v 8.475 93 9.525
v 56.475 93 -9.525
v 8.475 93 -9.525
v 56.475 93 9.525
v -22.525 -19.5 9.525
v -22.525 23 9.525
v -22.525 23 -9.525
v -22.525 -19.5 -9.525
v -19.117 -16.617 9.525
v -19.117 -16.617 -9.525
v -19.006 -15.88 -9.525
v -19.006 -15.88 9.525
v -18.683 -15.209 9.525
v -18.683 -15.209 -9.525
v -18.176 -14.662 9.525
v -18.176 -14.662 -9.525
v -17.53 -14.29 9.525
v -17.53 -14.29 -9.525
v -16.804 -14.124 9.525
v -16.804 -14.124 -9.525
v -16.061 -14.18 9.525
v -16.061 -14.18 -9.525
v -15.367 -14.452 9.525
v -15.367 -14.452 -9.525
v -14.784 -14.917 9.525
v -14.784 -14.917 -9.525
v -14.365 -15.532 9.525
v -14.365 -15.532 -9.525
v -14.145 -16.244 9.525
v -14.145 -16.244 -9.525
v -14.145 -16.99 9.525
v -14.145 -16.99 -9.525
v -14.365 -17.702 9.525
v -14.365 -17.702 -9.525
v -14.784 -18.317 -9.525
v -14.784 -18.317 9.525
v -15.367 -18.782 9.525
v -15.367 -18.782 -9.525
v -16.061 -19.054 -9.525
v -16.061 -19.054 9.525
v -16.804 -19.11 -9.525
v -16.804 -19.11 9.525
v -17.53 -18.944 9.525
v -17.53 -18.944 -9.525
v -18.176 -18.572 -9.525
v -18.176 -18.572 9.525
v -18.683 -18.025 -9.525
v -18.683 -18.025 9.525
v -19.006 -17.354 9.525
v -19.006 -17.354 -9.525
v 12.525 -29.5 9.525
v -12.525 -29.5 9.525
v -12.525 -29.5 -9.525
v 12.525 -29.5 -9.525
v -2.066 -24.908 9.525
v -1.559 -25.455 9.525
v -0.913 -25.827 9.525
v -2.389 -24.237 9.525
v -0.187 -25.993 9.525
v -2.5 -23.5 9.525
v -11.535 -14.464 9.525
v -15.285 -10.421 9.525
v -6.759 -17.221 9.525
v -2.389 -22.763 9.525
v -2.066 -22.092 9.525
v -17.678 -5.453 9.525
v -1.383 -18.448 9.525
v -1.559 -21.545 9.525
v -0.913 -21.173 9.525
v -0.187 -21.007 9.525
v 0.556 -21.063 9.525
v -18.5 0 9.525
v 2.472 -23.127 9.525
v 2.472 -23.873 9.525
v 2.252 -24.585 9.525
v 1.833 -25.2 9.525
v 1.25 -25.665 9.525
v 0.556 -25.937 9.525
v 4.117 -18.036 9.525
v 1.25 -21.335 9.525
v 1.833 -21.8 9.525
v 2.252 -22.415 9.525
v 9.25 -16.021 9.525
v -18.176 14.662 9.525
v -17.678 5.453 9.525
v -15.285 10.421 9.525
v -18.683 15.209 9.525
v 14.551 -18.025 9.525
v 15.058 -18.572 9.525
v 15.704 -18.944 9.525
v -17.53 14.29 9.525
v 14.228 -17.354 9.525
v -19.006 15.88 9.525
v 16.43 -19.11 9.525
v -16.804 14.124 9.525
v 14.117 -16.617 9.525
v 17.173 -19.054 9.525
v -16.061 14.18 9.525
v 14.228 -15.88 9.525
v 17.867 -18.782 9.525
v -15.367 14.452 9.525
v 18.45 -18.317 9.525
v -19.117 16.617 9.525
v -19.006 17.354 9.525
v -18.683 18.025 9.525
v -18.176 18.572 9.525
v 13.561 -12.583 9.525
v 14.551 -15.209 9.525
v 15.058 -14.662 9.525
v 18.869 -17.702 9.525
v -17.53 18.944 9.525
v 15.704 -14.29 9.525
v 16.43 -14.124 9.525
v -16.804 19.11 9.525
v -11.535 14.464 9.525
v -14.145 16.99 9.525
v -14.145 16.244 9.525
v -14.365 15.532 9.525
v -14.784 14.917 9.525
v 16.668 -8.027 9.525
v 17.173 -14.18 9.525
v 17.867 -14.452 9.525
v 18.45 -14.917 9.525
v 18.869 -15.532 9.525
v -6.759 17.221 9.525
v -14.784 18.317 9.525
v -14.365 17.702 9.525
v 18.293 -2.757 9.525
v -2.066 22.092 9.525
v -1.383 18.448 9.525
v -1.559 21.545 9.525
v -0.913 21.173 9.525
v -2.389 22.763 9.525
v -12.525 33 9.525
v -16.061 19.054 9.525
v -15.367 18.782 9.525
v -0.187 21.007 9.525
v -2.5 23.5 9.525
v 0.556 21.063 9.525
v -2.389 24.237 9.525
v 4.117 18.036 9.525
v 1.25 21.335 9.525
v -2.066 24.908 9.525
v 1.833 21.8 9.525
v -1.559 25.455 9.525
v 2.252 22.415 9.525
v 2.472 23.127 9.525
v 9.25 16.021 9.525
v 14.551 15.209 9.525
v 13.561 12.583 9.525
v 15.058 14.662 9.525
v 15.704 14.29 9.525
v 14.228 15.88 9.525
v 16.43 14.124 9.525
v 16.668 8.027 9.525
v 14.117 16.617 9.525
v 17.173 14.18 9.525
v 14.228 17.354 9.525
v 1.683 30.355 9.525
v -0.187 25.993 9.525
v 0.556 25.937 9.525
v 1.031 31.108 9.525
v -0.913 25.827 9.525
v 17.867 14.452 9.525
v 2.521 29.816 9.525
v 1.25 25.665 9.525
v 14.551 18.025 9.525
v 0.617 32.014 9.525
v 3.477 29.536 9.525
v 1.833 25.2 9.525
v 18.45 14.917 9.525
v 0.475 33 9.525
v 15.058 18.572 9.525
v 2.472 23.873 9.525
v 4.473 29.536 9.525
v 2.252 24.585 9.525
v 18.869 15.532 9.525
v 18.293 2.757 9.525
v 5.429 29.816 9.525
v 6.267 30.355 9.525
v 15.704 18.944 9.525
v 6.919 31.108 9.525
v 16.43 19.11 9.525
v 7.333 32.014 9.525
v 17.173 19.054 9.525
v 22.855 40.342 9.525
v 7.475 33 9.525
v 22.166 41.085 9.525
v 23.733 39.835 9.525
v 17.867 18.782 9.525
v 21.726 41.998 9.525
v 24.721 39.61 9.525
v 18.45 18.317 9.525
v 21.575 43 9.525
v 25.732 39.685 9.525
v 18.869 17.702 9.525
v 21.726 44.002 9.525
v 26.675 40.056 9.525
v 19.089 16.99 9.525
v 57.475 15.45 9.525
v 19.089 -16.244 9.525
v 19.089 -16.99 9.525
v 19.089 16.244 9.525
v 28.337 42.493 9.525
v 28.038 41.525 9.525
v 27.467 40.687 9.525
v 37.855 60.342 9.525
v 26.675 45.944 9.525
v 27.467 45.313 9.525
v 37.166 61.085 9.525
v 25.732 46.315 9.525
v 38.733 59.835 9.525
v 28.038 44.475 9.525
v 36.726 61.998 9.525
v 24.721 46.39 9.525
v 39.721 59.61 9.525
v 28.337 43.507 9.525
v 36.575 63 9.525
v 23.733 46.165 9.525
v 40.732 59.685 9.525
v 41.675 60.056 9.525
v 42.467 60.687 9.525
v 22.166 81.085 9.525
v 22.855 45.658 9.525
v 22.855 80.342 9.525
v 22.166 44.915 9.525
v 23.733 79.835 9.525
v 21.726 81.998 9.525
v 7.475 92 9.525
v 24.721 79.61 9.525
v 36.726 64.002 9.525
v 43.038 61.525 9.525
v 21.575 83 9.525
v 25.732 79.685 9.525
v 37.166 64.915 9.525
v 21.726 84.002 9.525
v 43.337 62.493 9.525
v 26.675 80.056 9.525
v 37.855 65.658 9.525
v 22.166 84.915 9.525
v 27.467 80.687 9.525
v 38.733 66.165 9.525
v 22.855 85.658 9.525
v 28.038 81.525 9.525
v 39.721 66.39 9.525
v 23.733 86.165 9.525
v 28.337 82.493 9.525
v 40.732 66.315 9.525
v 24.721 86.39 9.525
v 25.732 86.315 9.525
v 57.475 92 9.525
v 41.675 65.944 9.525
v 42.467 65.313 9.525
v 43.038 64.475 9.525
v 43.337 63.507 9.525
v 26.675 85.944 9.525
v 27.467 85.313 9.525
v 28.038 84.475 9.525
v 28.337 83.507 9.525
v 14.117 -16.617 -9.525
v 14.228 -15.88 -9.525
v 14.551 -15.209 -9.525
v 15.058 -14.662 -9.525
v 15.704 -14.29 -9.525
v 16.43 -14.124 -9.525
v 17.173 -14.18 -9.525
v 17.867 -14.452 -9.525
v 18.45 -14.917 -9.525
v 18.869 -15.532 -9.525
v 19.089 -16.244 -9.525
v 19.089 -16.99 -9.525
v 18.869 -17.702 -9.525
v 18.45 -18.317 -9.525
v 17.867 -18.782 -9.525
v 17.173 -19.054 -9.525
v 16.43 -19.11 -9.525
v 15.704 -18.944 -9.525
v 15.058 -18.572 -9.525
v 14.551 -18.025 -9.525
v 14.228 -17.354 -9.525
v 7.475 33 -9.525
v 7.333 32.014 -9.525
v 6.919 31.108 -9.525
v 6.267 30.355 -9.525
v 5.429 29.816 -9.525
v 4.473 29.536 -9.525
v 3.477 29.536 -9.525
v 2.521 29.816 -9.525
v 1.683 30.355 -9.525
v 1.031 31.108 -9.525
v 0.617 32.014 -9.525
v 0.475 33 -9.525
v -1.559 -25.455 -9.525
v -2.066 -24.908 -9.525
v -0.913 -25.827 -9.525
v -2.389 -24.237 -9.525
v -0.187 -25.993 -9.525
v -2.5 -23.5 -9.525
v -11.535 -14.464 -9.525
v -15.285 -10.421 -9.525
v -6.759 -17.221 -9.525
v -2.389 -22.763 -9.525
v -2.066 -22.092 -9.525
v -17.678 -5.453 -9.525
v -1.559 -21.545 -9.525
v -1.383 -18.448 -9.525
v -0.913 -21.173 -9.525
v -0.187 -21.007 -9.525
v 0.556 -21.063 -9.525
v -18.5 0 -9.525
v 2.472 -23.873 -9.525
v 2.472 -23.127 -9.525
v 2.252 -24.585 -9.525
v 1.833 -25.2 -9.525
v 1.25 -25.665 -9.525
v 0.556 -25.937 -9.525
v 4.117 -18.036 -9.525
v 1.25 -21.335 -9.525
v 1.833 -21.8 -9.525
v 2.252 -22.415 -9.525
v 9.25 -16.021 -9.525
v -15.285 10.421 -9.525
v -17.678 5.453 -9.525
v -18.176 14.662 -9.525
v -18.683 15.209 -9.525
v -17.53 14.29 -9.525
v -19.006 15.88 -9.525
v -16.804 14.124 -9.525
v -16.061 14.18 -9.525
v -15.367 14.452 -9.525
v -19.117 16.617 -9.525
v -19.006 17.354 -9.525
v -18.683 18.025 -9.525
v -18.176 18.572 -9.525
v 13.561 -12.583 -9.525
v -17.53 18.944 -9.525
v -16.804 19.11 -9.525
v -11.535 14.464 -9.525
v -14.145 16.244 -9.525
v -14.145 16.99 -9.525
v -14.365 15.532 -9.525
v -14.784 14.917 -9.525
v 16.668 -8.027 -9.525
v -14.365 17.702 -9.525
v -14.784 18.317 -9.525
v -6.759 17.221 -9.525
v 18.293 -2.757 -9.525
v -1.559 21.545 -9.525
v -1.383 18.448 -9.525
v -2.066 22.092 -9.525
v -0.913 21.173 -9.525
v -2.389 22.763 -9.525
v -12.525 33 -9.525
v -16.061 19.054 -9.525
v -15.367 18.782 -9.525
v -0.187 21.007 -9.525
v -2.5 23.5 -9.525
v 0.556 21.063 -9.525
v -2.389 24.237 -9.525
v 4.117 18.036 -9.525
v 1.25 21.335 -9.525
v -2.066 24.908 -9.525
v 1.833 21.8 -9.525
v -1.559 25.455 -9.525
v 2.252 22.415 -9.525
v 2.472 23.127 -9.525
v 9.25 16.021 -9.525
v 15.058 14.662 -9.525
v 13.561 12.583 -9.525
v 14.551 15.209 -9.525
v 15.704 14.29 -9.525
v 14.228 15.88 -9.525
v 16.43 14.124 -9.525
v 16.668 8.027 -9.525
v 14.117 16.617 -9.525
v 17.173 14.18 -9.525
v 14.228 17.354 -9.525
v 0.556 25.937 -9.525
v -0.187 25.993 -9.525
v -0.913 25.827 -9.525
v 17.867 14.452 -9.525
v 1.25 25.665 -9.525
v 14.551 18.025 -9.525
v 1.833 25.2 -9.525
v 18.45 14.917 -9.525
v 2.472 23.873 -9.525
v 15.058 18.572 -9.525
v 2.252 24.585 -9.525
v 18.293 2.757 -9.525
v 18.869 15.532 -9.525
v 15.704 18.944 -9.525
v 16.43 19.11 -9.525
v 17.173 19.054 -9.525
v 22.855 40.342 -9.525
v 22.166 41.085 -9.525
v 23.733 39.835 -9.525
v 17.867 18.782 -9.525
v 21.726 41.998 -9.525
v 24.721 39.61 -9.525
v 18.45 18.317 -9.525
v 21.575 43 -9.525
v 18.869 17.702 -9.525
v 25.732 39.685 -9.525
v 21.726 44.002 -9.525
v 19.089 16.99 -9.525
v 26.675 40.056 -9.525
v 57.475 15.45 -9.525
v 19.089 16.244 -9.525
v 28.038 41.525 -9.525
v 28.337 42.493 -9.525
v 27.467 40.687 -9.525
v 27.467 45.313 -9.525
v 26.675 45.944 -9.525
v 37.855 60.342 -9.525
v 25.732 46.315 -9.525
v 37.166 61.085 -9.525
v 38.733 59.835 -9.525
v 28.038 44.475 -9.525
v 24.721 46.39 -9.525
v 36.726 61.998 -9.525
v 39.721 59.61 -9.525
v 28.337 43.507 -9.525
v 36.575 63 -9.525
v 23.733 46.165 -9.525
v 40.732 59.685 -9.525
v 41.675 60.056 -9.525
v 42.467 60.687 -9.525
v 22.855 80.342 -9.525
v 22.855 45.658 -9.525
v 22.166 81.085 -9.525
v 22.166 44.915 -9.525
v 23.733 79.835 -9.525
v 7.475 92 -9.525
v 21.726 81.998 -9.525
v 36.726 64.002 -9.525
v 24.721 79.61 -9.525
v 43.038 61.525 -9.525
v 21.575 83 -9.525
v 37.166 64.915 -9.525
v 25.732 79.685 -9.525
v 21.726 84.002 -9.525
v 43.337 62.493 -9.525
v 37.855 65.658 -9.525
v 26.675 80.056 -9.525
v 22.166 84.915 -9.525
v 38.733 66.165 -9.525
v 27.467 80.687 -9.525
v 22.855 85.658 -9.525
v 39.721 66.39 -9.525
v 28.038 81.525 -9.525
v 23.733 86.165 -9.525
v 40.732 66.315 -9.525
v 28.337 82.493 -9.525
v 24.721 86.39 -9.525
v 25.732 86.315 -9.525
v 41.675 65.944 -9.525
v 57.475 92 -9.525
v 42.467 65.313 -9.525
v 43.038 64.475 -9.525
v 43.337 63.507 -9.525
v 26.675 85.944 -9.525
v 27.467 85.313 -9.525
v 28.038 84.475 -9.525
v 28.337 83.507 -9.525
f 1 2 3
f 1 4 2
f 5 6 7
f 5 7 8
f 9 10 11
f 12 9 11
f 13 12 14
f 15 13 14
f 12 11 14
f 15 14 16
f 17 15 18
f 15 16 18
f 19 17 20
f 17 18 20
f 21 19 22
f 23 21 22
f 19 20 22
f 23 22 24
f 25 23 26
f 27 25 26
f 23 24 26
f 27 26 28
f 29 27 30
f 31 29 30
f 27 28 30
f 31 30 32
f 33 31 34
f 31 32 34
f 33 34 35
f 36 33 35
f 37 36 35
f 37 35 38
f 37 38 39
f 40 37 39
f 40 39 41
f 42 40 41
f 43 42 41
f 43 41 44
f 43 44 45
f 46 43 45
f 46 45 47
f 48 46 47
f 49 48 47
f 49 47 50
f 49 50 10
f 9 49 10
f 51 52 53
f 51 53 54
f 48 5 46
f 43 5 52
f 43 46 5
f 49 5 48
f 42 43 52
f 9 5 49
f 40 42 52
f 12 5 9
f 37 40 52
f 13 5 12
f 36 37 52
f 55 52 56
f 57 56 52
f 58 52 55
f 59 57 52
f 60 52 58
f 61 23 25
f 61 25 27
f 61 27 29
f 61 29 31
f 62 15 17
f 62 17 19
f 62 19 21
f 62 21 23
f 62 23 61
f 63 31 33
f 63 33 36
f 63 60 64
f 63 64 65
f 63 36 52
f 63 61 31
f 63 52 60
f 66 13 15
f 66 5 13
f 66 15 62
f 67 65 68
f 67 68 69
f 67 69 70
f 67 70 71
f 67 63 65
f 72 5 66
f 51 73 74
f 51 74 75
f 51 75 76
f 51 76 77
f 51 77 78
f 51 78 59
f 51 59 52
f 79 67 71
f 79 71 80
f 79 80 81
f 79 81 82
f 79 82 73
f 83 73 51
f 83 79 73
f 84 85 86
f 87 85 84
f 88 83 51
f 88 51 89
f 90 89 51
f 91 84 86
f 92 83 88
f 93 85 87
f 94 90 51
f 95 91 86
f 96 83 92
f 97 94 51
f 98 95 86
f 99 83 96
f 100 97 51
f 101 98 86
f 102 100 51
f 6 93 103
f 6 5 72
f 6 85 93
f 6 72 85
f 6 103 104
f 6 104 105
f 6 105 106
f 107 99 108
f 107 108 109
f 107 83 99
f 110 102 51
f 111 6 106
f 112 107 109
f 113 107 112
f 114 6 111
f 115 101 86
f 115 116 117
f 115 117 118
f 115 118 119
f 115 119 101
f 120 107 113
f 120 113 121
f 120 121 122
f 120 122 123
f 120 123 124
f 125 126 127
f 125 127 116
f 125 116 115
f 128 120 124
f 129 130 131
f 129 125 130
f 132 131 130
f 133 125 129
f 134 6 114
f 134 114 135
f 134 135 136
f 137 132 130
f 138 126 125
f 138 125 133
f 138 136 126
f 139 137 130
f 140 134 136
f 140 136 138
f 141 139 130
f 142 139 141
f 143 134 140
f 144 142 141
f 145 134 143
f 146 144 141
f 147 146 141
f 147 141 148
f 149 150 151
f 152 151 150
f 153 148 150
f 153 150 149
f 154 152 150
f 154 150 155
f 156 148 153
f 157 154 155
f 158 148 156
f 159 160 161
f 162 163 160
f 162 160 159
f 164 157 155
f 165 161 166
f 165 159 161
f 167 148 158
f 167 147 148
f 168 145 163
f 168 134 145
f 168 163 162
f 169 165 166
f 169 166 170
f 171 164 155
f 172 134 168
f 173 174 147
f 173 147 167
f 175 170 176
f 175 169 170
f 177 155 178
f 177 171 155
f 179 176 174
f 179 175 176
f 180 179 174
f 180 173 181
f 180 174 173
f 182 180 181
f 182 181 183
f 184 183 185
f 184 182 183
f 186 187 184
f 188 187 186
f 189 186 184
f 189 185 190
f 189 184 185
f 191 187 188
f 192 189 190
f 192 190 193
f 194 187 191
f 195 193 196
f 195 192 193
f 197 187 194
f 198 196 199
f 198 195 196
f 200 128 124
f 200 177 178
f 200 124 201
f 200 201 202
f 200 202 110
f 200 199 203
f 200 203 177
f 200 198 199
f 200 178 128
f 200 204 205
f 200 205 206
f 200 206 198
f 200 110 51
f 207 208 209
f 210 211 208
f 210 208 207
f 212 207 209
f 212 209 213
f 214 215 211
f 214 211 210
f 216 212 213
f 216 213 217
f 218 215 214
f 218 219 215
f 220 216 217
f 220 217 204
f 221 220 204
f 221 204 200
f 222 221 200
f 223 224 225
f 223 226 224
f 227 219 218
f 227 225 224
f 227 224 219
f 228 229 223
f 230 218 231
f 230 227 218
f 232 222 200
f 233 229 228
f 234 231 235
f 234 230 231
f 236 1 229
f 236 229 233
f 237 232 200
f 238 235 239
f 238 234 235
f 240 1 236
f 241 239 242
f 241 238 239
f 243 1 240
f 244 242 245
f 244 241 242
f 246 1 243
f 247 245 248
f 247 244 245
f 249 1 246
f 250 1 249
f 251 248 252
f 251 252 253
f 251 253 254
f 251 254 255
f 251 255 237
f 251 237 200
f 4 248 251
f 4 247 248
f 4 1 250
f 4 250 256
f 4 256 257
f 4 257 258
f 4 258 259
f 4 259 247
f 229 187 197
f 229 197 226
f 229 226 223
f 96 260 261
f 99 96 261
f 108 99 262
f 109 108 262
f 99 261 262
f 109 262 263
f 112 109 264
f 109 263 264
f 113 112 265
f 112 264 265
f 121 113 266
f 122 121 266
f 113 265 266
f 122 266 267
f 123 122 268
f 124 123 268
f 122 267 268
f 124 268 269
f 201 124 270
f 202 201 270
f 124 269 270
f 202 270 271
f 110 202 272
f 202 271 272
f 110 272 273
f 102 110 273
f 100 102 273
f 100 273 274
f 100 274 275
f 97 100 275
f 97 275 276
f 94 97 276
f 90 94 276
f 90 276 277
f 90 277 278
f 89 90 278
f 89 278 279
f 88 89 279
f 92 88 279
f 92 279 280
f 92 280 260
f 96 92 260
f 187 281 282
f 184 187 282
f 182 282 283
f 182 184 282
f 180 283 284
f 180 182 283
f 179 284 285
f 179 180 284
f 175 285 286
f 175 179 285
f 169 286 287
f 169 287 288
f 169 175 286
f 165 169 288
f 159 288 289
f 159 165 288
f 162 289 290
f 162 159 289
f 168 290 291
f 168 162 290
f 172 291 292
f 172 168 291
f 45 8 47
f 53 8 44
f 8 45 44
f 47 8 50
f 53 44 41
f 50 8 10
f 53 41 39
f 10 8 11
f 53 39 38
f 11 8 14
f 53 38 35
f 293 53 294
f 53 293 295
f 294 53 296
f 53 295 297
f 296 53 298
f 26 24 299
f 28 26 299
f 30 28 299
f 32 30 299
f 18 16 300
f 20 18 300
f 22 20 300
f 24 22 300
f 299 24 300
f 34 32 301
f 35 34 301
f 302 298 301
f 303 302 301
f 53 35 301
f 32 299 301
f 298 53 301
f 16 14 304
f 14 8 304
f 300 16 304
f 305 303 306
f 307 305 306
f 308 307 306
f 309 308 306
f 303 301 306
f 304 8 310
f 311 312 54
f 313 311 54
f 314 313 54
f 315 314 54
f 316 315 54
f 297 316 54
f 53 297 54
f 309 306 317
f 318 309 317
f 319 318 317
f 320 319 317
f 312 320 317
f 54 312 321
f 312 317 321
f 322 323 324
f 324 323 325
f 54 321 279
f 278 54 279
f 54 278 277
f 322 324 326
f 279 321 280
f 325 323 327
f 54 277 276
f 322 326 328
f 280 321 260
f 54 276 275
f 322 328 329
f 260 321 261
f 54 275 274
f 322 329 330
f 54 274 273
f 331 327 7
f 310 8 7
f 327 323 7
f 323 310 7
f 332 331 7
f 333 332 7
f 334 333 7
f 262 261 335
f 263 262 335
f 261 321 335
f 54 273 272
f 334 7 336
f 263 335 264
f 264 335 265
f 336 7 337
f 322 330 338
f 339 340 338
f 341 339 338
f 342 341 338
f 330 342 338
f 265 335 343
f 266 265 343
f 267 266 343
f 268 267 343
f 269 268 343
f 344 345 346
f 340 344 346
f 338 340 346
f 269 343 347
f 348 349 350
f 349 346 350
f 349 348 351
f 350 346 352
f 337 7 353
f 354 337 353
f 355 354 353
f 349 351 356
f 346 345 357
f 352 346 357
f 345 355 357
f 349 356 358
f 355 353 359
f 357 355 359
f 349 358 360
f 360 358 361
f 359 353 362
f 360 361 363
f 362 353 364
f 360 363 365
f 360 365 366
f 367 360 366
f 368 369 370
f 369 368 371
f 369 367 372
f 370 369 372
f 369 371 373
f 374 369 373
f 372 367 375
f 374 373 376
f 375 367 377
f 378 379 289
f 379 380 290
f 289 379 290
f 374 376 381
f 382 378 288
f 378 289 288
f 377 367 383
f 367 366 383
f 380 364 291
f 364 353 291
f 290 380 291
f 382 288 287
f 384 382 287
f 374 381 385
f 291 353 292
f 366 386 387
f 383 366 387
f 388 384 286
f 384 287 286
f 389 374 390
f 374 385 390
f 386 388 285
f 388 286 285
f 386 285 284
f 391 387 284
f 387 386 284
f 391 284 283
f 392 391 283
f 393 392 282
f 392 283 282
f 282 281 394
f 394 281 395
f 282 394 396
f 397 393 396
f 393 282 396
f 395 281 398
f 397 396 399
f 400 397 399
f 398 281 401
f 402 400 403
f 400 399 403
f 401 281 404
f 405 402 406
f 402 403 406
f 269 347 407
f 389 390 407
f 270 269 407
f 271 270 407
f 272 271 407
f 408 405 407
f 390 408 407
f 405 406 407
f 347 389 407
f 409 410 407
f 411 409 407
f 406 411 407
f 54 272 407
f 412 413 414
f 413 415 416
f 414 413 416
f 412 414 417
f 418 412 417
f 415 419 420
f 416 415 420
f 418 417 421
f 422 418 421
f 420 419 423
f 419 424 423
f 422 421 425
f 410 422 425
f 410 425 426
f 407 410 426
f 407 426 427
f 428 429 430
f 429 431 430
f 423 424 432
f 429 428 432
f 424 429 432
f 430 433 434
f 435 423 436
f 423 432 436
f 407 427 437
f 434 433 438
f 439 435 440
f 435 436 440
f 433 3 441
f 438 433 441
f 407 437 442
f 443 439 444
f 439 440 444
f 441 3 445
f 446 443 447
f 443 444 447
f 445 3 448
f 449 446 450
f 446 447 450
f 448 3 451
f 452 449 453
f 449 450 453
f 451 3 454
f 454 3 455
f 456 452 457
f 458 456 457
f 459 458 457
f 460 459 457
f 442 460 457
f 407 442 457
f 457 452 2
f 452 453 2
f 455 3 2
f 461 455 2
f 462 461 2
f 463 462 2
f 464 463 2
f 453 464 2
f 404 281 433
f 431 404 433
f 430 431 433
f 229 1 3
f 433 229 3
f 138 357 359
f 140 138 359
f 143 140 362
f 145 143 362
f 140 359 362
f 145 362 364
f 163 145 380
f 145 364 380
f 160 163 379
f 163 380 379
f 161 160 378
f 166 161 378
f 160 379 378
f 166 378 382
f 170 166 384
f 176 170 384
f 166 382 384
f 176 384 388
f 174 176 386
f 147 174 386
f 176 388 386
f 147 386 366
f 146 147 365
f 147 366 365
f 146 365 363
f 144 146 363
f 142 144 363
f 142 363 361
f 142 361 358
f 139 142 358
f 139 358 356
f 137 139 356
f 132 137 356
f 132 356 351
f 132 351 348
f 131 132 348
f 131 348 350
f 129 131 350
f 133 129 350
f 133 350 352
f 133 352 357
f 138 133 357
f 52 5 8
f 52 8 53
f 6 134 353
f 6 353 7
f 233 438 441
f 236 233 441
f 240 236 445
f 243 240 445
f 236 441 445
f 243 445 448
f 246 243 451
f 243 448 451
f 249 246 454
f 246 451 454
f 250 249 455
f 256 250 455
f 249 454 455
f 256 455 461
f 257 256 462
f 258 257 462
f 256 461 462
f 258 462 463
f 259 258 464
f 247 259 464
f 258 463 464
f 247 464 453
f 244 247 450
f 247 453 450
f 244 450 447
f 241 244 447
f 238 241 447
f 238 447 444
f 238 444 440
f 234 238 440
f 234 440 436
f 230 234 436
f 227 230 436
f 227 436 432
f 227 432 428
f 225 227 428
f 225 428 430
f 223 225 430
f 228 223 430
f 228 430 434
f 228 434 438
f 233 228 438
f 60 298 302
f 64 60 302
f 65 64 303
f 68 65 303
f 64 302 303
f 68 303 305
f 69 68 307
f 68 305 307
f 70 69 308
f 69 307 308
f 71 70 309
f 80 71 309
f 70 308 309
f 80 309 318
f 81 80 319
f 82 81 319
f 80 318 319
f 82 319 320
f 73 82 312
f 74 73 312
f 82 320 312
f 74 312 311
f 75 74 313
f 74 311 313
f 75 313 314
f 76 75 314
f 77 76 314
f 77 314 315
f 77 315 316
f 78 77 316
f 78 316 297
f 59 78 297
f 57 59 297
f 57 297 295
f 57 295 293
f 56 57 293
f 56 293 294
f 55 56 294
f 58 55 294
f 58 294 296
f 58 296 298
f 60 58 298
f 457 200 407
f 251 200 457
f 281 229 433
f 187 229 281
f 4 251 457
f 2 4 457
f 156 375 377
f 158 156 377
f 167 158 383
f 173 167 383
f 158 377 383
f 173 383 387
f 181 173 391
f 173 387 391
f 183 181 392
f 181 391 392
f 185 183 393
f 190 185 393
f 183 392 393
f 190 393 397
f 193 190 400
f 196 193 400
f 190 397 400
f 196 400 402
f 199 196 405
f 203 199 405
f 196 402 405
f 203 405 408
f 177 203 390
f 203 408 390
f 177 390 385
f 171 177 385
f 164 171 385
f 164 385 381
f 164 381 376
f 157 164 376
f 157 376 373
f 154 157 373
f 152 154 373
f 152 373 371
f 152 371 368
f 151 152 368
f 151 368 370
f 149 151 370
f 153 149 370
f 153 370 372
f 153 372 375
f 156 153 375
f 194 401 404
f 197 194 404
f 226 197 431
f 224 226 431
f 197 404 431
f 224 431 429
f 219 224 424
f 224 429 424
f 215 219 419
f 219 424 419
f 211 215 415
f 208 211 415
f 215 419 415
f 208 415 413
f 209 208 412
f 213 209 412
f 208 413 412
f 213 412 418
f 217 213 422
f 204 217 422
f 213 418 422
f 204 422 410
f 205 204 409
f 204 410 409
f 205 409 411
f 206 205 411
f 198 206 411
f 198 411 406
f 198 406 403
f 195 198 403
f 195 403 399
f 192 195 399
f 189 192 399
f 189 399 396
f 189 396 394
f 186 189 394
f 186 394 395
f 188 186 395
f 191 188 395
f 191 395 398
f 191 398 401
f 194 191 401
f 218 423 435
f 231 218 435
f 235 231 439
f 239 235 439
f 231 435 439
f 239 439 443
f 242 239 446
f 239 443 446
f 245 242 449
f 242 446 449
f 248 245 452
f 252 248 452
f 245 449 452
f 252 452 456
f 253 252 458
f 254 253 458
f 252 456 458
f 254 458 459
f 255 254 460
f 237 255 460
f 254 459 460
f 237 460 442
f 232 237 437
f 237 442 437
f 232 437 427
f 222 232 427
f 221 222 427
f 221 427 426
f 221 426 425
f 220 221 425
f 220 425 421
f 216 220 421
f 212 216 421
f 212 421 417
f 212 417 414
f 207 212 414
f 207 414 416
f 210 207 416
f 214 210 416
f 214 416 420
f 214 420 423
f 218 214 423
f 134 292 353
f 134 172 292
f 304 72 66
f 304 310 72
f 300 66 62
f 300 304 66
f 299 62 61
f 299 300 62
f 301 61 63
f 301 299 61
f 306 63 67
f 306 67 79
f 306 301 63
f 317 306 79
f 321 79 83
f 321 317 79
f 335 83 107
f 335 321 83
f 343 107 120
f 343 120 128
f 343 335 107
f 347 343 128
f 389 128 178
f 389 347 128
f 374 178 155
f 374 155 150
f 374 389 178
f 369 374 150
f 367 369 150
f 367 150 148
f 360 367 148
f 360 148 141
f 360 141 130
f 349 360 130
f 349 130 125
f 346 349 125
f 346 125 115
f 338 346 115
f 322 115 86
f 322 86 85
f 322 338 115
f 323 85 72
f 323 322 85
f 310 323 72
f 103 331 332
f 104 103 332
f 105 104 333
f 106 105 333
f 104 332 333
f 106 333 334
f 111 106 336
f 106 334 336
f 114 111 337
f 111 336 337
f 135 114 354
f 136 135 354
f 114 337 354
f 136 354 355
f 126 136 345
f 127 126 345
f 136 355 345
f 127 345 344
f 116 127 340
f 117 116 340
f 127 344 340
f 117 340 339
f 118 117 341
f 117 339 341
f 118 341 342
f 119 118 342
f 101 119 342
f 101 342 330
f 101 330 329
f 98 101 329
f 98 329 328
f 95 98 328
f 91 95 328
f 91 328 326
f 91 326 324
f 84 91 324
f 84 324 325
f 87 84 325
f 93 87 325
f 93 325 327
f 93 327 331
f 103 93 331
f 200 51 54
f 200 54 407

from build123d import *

# Parameters (mm, degrees)
SKETCH1_R              = 18.5
BOSS_EXTRUDE1_DEPTH    = 9.525
M8X1_25_TAPPED_HOLE1_D = 6.8
TAPPED_HOLE0_D         = 5
CHAMFER1_SIZE          = 1


with BuildPart() as part:
    # Sketch1 → Boss-Extrude1 (new, symmetric)
    with BuildSketch(Plane.XY):
        with BuildLine():
            Line((0.475, 33), (-12.525, 33))
            Line((-12.525, 33), (-22.525, 23))
            Line((-22.525, 23), (-22.525, -19.5))
            Line((-22.525, -19.5), (-12.525, -29.5))
            Line((-12.525, -29.5), (12.525, -29.5))
            Line((12.525, -29.5), (57.475, 15.45))
            Line((57.475, 15.45), (57.475, 93))
            Line((57.475, 93), (7.475, 93))
            Line((7.475, 93), (7.475, 33))
            ThreePointArc((7.475, 33), (3.975, 29.5), (0.475, 33))
        make_face()
        with Locations(Location((0, 0, 0), (0, 0, 180))):
            Circle(SKETCH1_R, mode=Mode.SUBTRACT)
    extrude(amount=BOSS_EXTRUDE1_DEPTH, both=True)

    # M8x1.25 Tapped Hole1 (through all)
    with Locations(Plane.XY.offset(9.525)):
        with Locations((24.975, 43), (39.975, 63), (24.975, 83)):
            Hole(M8X1_25_TAPPED_HOLE1_D / 2)

    # Tapped Hole0 (through all)
    with Locations(Plane.XY.offset(9.525)):
        with Locations((0, 23.5), (-16.617009358, 16.617009358), (16.617009358, 16.617009358), (16.617009358, -16.617009358), (0, -23.5), (-16.617009358, -16.617009358)):
            Hole(TAPPED_HOLE0_D / 2)

    # Chamfer1
    chamfer1_edges = [part.edges().sort_by_distance(p)[0] for p in [
        (7.475, 93, 0),
        (57.475, 93, 0),
    ]]
    chamfer(chamfer1_edges, length=CHAMFER1_SIZE)


solid = part.part
